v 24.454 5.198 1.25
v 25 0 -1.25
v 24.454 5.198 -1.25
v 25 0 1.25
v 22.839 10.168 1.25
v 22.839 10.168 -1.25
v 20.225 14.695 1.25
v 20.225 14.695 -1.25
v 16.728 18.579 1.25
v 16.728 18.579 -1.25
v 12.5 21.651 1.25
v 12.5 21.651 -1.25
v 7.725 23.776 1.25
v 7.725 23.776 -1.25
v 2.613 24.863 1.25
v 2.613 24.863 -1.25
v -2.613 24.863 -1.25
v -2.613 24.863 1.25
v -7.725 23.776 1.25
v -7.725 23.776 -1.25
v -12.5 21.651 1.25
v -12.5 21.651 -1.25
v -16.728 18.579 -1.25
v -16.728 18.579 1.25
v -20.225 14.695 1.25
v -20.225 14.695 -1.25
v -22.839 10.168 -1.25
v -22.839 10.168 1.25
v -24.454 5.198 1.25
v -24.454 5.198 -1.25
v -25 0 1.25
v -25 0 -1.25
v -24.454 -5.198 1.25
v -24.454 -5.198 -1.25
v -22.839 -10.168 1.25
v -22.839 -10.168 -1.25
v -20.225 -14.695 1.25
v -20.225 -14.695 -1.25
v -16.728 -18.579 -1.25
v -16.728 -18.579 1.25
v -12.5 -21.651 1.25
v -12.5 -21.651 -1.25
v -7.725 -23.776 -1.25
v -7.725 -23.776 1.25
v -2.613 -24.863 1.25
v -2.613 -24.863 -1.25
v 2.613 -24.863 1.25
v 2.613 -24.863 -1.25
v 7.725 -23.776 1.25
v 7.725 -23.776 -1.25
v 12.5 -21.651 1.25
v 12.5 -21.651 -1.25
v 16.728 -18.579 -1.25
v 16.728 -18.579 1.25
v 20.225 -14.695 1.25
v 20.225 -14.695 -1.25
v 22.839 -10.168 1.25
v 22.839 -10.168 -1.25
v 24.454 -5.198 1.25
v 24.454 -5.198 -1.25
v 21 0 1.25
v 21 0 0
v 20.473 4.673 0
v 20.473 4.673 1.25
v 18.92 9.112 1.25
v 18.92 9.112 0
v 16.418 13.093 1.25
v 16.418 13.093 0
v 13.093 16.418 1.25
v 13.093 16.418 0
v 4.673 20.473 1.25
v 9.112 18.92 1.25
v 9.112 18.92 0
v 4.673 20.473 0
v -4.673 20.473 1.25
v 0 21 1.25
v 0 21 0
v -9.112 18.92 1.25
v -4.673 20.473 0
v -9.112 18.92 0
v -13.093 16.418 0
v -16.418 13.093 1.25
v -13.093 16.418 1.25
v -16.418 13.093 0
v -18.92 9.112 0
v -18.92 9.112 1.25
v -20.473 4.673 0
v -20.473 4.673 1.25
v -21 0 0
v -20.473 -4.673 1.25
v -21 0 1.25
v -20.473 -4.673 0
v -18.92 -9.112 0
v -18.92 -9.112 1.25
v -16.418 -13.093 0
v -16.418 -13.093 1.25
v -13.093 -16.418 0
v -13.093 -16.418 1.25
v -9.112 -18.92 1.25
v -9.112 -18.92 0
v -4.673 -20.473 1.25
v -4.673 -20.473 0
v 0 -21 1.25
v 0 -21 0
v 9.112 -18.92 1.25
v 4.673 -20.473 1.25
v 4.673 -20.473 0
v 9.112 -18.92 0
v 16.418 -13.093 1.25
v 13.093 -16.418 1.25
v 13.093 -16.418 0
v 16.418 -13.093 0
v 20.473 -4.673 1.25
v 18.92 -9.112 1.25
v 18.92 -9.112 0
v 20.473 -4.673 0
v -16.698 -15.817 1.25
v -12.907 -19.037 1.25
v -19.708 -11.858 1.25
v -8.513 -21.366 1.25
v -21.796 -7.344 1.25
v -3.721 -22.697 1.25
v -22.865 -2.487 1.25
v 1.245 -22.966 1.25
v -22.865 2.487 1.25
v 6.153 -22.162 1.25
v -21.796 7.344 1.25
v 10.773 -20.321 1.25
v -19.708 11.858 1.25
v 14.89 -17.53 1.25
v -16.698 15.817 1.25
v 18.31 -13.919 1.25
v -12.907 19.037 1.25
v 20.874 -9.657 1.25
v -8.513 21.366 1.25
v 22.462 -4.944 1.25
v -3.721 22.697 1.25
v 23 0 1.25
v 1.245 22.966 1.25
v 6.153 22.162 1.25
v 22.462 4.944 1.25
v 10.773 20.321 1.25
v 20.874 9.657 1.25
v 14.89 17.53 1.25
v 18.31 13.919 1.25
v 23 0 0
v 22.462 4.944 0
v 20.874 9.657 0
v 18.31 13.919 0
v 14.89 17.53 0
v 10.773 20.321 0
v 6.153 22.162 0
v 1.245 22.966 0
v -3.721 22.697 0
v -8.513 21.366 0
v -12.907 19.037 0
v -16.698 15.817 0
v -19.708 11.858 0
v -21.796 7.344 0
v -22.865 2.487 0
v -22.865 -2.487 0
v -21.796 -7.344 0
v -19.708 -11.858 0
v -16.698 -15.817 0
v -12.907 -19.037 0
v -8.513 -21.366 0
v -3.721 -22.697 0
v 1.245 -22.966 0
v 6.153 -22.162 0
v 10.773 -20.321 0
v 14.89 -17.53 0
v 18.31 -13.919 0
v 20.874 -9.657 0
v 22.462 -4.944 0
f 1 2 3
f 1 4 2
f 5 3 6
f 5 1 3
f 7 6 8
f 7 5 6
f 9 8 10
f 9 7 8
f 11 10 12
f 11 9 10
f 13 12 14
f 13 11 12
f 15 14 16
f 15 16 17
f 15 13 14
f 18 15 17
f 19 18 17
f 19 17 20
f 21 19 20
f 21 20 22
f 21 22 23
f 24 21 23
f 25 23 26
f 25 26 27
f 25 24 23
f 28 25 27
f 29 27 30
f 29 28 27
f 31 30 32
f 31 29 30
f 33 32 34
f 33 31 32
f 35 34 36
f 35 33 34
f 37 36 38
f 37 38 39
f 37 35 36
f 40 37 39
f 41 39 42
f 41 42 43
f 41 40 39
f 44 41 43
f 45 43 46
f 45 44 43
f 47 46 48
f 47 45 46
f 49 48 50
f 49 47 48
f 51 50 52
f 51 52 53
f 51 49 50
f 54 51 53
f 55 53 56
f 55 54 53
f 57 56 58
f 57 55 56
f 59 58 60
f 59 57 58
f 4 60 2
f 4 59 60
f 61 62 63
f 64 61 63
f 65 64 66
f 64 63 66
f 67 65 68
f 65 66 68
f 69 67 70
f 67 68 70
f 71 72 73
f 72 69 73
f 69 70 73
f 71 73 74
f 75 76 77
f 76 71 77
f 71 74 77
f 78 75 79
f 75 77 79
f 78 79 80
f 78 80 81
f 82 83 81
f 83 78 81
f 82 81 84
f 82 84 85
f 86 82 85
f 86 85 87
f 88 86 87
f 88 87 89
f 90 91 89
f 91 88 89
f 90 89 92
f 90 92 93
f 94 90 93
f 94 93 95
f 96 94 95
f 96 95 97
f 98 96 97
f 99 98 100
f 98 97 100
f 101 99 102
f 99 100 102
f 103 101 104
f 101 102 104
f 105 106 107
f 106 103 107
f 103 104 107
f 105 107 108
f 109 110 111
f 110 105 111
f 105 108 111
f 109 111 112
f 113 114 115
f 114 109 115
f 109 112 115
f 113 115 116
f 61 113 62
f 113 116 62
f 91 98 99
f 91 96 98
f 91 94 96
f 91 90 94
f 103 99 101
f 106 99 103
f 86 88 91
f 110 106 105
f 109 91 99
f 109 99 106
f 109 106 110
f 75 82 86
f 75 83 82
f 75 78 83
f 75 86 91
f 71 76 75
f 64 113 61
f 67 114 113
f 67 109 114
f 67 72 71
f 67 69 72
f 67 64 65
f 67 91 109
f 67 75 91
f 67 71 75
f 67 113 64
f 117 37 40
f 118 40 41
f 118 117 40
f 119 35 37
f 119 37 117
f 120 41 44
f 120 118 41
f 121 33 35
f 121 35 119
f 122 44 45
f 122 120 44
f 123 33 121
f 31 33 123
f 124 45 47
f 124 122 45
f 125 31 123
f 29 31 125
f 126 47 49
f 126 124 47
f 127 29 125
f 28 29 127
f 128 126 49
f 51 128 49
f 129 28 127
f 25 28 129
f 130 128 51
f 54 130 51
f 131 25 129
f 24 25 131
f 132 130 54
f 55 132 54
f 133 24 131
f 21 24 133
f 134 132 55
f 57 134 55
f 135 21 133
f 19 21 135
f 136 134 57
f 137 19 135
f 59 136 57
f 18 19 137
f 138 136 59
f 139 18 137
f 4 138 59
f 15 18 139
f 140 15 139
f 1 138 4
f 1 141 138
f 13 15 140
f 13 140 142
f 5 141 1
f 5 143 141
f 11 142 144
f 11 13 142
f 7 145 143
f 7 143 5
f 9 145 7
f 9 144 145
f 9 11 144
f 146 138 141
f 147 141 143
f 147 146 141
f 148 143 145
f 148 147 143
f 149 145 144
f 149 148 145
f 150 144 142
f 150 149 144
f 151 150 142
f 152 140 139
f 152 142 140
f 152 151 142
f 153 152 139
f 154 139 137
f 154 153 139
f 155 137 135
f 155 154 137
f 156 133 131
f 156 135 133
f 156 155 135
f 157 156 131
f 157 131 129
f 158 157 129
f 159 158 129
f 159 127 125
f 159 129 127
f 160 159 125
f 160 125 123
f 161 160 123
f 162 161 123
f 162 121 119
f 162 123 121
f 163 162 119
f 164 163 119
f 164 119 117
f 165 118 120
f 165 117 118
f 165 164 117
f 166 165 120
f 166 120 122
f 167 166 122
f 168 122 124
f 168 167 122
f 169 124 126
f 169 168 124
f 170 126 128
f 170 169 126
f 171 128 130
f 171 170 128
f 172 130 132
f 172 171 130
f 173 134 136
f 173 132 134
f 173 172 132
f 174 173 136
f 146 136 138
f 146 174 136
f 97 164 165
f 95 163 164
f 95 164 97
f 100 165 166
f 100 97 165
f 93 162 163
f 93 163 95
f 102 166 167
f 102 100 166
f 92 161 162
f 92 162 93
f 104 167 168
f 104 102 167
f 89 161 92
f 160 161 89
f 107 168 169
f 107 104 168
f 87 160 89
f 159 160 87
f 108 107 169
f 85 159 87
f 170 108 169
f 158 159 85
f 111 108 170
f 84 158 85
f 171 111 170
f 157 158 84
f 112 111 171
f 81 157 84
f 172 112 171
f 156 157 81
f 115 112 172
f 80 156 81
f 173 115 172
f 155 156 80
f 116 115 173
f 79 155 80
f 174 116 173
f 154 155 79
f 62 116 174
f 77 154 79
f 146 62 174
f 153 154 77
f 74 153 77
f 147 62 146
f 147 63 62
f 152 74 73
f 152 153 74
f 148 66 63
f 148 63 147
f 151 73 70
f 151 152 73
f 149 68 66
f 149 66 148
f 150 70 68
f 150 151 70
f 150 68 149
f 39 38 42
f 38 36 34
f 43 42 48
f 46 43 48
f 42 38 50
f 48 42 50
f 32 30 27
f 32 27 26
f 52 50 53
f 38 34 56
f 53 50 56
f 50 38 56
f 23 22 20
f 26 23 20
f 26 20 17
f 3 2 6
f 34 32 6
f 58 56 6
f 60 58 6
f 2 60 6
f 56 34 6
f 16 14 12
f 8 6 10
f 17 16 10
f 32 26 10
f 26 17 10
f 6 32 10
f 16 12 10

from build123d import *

# Parameters (mm, degrees)
F0_R     = 25
F0_R_2   = 23
F0_R_3   = 21
F1_DEPTH = 1.25
F2_DEPTH = 25


with BuildPart() as f1:
    # F0 (on Top) → F1 (new body, symmetric)
    with BuildSketch(Plane.XY):
        Circle(F0_R)
        Circle(F0_R_2, mode=Mode.SUBTRACT)
        Circle(F0_R_2)
        Circle(F0_R_3, mode=Mode.SUBTRACT)
        Circle(F0_R_3)
    extrude(amount=F1_DEPTH, both=True)

    # F0 (on Top) → F2 (cut)
    with BuildSketch(Plane.XY):
        Circle(F0_R_2)
        Circle(F0_R_3, mode=Mode.SUBTRACT)
    extrude(amount=F2_DEPTH, mode=Mode.SUBTRACT)


solid = f1.part
